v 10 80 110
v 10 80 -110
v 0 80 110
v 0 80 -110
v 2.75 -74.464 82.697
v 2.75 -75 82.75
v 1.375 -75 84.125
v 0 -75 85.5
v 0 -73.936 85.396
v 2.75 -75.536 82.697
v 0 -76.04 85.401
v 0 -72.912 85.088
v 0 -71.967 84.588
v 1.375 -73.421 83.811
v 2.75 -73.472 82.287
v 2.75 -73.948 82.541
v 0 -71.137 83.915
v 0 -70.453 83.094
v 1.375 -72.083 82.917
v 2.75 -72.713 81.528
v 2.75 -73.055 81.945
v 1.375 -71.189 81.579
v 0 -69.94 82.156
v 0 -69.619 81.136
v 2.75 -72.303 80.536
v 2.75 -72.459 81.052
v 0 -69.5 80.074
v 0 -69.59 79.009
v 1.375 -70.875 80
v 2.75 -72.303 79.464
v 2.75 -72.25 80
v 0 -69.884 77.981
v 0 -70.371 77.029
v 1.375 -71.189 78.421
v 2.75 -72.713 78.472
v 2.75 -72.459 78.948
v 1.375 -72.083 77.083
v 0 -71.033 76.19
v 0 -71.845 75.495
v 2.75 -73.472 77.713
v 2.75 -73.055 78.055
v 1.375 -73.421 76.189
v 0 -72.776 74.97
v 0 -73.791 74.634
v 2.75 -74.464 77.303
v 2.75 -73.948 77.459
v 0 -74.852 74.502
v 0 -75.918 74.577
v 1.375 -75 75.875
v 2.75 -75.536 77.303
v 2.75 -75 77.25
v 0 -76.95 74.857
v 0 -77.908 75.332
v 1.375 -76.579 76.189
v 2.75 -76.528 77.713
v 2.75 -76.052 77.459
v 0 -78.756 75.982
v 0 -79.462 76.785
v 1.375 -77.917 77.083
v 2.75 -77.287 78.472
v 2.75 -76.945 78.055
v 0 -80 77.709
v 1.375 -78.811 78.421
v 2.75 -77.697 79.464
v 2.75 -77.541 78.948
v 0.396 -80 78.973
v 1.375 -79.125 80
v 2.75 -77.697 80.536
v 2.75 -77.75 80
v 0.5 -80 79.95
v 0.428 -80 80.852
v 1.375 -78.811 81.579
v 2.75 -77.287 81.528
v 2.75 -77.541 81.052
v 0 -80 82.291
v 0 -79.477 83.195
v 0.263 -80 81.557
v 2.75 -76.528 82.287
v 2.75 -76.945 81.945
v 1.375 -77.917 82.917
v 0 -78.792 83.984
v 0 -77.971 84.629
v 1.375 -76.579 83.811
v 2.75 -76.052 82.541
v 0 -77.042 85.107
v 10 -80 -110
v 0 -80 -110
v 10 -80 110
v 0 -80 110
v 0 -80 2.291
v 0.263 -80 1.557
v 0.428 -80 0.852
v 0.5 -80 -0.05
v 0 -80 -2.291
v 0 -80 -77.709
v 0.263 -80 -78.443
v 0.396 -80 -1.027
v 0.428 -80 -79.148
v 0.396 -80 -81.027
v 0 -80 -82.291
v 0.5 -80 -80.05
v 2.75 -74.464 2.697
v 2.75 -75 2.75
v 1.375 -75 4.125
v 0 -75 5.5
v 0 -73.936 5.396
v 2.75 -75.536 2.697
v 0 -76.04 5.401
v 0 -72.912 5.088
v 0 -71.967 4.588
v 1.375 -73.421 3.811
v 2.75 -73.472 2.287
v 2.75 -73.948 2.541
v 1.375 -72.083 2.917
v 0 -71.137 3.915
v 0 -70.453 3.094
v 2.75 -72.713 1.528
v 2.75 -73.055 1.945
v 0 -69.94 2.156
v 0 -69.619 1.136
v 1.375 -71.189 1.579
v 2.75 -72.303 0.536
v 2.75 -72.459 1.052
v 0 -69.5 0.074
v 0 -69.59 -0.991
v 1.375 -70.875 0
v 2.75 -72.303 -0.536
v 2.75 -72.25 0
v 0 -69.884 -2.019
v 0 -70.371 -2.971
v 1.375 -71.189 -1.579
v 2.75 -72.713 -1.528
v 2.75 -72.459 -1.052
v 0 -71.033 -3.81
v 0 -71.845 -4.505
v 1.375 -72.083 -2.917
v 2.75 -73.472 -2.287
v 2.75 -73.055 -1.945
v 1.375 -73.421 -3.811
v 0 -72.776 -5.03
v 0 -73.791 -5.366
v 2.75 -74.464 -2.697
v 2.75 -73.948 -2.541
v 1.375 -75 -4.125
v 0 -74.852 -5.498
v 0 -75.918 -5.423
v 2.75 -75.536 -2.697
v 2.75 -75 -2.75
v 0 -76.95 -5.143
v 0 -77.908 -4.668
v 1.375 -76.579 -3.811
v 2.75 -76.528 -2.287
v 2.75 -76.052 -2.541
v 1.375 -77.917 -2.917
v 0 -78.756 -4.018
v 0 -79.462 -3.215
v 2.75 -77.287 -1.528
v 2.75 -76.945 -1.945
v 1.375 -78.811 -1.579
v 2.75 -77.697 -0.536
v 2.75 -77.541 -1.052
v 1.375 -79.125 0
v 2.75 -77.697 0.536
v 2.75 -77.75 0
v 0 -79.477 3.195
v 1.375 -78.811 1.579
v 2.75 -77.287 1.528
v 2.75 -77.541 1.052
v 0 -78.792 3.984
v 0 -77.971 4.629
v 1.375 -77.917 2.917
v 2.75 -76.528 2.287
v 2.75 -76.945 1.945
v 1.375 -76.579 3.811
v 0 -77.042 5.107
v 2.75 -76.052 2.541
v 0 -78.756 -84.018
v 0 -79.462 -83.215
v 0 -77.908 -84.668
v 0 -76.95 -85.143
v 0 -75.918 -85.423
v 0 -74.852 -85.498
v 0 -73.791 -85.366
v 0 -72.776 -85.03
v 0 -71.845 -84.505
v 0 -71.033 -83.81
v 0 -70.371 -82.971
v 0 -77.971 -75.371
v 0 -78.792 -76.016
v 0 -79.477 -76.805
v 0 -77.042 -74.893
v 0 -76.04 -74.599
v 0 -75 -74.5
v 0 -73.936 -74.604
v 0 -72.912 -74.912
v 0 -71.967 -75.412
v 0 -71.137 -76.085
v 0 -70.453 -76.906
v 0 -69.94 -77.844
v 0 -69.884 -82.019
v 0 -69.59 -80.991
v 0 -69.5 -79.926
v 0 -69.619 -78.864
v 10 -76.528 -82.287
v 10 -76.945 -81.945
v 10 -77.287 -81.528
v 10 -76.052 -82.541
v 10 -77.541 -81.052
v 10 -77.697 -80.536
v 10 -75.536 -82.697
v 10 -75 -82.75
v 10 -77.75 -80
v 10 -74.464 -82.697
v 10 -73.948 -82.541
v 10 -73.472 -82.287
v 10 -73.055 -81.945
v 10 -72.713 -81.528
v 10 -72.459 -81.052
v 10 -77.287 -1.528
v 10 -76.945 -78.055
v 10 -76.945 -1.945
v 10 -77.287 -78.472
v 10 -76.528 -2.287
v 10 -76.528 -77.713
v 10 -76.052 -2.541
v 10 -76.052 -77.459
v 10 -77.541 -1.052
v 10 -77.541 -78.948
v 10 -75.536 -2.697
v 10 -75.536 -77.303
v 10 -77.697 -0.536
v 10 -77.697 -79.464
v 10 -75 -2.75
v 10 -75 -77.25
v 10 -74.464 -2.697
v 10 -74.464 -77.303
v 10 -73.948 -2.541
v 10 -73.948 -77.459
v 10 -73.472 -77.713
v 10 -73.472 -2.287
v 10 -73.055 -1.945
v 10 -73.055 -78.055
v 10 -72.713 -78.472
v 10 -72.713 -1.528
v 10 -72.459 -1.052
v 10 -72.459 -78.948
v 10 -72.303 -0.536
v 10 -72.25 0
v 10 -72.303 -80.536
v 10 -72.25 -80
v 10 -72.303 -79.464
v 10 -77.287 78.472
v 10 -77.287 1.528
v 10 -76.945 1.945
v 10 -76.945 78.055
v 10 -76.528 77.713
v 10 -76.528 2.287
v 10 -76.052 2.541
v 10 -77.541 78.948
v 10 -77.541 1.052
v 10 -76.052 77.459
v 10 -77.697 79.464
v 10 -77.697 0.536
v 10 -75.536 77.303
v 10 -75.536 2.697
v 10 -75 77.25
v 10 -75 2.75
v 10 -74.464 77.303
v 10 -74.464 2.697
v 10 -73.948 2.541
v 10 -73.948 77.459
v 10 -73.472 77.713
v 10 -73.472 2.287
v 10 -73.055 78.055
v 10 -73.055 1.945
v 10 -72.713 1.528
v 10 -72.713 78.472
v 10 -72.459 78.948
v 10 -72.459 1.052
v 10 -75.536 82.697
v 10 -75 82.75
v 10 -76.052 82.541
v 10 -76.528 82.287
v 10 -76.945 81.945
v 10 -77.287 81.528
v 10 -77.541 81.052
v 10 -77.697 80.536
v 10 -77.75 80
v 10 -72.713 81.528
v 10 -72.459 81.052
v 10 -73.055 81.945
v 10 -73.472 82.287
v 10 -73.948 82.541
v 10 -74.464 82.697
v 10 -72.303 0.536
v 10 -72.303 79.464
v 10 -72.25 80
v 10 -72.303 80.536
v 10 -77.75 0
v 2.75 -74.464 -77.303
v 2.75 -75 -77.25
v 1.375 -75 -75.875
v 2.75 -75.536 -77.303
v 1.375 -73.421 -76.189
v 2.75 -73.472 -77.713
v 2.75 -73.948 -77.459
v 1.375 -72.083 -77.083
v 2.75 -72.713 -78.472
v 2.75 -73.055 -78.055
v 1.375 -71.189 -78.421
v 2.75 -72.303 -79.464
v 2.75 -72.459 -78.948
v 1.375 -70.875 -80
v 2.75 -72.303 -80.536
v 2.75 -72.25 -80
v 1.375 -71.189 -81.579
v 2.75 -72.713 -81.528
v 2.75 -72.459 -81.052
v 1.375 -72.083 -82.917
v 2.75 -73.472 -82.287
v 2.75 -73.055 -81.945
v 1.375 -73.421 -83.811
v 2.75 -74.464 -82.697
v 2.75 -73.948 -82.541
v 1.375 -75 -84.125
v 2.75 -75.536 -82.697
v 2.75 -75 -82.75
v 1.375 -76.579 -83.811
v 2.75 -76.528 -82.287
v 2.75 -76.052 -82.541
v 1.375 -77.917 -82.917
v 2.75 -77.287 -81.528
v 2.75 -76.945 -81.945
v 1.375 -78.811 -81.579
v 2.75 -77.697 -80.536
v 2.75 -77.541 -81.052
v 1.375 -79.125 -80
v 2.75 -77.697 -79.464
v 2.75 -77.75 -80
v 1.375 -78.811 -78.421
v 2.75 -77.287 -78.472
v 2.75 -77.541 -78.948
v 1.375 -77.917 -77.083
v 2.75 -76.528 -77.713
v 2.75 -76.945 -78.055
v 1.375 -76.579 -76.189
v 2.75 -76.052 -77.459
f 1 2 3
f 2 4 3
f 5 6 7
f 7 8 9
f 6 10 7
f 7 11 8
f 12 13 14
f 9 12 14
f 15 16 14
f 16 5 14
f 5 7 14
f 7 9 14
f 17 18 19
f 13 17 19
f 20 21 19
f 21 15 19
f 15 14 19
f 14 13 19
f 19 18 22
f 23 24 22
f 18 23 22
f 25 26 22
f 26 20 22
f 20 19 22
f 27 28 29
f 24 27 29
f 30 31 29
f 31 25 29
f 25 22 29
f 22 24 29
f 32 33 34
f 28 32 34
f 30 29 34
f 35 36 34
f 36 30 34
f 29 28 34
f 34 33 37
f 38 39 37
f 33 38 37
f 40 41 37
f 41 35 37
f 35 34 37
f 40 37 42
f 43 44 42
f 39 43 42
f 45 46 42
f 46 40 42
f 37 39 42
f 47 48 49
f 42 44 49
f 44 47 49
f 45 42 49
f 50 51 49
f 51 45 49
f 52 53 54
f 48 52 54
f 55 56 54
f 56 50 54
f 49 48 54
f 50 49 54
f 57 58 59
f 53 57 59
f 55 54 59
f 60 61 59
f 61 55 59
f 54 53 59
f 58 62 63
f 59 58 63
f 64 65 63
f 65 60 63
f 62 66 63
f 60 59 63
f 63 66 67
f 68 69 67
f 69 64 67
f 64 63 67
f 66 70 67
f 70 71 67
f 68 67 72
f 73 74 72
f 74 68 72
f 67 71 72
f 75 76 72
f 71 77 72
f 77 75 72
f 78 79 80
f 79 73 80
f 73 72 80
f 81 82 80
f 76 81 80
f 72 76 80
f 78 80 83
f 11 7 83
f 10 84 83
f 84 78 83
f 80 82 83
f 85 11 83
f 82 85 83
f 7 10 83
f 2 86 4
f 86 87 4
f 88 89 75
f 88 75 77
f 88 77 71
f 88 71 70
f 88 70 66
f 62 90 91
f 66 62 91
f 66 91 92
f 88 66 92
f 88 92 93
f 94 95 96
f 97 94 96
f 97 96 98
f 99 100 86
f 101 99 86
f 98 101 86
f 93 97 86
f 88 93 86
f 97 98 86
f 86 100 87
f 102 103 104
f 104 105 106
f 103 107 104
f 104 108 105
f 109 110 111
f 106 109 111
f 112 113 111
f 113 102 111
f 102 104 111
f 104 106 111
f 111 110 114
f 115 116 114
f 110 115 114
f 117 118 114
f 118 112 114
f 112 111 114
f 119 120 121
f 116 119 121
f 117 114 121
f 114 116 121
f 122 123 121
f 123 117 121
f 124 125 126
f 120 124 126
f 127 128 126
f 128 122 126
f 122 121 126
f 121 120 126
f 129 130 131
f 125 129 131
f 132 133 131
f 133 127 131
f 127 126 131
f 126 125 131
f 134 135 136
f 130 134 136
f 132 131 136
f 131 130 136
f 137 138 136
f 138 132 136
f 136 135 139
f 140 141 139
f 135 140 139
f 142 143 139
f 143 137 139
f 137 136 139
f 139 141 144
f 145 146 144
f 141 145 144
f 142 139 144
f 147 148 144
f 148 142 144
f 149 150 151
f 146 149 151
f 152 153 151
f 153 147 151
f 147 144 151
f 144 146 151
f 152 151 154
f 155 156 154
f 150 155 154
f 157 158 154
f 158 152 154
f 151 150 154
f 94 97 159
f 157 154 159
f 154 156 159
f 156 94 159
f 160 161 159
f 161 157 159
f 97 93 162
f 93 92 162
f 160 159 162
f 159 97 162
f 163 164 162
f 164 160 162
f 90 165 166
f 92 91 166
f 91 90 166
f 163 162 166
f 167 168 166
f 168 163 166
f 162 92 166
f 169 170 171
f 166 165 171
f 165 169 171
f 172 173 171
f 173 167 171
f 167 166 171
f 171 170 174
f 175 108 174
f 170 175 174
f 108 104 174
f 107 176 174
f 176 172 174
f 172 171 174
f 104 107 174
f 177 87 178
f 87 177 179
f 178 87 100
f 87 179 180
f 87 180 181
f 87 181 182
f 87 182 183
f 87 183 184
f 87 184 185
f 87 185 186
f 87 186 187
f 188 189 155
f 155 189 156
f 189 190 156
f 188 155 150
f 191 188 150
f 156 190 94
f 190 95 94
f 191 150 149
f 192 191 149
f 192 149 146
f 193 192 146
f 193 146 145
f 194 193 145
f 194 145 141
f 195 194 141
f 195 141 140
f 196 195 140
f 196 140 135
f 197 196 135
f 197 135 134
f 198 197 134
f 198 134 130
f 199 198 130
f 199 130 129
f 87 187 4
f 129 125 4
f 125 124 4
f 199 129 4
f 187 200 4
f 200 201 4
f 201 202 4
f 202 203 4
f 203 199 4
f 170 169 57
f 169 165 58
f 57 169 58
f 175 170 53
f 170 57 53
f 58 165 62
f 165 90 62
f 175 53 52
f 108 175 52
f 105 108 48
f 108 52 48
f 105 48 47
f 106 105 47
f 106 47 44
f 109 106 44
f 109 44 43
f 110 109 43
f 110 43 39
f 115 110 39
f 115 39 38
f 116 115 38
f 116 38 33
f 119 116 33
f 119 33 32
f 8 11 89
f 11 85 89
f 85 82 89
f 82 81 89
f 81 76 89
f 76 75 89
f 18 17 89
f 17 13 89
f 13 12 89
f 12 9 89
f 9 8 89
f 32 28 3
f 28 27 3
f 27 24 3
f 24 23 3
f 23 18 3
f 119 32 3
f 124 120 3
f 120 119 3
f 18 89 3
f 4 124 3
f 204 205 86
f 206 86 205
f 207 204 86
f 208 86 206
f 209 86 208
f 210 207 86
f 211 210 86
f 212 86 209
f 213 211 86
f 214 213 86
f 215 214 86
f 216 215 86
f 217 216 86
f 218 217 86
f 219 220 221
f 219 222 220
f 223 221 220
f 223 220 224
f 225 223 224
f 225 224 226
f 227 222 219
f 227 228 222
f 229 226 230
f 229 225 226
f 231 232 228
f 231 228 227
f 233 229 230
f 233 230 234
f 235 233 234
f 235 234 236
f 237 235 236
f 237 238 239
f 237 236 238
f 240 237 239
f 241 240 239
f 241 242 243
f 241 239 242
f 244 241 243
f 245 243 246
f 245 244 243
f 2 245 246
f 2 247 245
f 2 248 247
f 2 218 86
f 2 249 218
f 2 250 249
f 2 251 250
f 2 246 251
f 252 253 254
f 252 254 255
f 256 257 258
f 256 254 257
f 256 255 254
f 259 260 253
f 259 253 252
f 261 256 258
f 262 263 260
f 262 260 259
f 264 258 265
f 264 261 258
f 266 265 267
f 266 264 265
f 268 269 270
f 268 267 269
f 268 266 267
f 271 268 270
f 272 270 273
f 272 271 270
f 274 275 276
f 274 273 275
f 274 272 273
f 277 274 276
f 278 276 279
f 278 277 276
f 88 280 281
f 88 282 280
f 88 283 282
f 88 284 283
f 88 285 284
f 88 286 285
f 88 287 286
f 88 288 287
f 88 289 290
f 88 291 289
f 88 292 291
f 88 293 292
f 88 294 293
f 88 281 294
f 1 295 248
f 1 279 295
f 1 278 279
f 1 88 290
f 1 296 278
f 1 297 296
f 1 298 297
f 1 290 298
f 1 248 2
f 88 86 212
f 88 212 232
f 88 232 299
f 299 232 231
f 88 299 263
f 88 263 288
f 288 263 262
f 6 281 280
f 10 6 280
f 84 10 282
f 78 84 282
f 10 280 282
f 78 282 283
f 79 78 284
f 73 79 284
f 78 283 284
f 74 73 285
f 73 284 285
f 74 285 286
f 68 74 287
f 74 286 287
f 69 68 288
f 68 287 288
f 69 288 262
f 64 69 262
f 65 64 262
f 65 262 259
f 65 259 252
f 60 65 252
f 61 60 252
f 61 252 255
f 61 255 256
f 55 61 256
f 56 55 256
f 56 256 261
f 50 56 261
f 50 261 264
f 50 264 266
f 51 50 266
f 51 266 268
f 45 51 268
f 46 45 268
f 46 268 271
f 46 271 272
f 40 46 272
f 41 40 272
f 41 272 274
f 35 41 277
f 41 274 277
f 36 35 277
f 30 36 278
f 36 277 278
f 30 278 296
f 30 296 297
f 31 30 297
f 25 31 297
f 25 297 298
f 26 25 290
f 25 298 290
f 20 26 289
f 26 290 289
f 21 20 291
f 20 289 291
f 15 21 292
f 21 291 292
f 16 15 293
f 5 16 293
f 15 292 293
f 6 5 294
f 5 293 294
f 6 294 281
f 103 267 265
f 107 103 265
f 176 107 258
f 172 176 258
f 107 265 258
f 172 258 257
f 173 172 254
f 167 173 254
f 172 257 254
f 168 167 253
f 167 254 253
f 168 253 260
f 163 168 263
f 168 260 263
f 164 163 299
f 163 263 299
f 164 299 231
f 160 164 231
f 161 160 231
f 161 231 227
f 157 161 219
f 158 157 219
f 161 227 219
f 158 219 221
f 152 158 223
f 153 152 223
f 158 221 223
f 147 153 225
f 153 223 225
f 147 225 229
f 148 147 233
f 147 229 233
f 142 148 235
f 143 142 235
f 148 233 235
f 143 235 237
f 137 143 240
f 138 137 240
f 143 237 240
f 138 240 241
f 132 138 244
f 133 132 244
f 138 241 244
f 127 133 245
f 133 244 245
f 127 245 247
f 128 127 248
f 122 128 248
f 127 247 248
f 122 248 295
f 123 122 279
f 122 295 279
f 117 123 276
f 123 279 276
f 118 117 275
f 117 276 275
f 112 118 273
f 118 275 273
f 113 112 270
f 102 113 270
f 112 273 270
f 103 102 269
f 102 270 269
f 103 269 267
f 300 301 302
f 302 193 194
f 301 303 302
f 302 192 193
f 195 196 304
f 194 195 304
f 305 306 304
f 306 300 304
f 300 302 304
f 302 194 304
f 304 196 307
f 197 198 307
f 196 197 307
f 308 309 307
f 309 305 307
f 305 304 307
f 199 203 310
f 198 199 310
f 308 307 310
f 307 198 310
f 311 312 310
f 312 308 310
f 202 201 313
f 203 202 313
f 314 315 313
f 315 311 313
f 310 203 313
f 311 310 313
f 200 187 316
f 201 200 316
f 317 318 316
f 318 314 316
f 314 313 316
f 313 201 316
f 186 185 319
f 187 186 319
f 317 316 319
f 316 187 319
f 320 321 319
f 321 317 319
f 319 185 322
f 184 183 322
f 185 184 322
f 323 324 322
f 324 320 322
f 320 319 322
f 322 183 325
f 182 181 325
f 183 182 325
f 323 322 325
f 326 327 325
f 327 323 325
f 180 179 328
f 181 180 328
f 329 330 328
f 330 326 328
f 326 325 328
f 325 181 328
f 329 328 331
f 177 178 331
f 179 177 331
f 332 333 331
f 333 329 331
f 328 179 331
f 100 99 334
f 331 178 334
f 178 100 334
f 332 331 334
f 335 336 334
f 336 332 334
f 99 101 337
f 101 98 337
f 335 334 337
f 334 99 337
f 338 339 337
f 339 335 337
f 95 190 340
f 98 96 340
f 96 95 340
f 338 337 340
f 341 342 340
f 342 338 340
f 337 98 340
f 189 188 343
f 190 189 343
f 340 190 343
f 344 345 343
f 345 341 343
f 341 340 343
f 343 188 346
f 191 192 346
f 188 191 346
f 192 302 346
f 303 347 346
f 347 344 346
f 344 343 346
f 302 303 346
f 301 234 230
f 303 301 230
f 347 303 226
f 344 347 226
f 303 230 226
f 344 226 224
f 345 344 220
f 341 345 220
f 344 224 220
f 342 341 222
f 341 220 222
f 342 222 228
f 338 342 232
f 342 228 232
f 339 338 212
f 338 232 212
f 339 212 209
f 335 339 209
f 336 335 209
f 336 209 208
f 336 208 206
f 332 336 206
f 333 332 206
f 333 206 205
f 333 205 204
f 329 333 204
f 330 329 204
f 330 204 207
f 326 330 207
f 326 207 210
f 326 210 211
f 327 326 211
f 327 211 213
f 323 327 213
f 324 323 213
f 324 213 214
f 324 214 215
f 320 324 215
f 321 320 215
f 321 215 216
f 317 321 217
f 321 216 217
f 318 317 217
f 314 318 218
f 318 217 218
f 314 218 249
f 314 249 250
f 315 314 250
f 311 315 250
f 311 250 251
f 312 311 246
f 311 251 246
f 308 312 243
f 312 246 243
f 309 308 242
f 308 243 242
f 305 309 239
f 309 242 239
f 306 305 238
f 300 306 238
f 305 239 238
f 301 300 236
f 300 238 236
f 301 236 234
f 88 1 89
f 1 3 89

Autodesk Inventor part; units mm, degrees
ref_plane "YZ Plane" through (0, 0, 0) normal (1, 0, 0) x (0, 1, 0)
ref_plane "XZ Plane" through (0, 0, 0) normal (0, 1, 0) x (-1, 0, 0)
ref_plane "XY Plane" through (0, 0, 0) normal (0, 0, 1) x (1, 0, 0)
sketch "Boceto1" plane through (0, 0, 0) normal (1, 0, 0) x (0, 1, 0)
  line L0 (-80, -110) -> (80, -110)
  line L1 (80, -110) -> (80, 110)
  line L2 (80, 110) -> (-80, 110)
  line L3 (-80, 110) -> (-80, -110)
  line L4 (-80, -110) -> (80, 110) construction
  line L5 (80, -110) -> (-80, 110) construction
  point P0 (0, 0)
  dimension "d0" = 160
  dimension "d1" = 220
extrude "Extrusión1" add sketch "Boceto1" along normal blind 10
sketch "Boceto2" plane through (0, 0, 0) normal (-1, 0, 0) x (0, 0, 1)
  line L0 (-110, 80) -> (110, 80) projected
  line L1 (110, 80) -> (110, -80) projected
  line L2 (-110, -80) -> (-110, 80) projected
  line L3 (-110, -80) -> (-110, 80) construction
  line L4 (-110, 0) -> (110, 0) construction
  point P0 (0, 0)
  point P1 (0, -75)
  point P2 (-80, -75)
  point P3 (80, -75)
hole "Agujero1" at (0, -75, -80) at (0, -75, 0) at (0, -75, 80) direction (1, 0, 0) diameter 5.5 depth 20 tip angle 118 countersink diameter 11 countersink angle 90
properties part number "LATERAL B" material "Plástico PMMA"
